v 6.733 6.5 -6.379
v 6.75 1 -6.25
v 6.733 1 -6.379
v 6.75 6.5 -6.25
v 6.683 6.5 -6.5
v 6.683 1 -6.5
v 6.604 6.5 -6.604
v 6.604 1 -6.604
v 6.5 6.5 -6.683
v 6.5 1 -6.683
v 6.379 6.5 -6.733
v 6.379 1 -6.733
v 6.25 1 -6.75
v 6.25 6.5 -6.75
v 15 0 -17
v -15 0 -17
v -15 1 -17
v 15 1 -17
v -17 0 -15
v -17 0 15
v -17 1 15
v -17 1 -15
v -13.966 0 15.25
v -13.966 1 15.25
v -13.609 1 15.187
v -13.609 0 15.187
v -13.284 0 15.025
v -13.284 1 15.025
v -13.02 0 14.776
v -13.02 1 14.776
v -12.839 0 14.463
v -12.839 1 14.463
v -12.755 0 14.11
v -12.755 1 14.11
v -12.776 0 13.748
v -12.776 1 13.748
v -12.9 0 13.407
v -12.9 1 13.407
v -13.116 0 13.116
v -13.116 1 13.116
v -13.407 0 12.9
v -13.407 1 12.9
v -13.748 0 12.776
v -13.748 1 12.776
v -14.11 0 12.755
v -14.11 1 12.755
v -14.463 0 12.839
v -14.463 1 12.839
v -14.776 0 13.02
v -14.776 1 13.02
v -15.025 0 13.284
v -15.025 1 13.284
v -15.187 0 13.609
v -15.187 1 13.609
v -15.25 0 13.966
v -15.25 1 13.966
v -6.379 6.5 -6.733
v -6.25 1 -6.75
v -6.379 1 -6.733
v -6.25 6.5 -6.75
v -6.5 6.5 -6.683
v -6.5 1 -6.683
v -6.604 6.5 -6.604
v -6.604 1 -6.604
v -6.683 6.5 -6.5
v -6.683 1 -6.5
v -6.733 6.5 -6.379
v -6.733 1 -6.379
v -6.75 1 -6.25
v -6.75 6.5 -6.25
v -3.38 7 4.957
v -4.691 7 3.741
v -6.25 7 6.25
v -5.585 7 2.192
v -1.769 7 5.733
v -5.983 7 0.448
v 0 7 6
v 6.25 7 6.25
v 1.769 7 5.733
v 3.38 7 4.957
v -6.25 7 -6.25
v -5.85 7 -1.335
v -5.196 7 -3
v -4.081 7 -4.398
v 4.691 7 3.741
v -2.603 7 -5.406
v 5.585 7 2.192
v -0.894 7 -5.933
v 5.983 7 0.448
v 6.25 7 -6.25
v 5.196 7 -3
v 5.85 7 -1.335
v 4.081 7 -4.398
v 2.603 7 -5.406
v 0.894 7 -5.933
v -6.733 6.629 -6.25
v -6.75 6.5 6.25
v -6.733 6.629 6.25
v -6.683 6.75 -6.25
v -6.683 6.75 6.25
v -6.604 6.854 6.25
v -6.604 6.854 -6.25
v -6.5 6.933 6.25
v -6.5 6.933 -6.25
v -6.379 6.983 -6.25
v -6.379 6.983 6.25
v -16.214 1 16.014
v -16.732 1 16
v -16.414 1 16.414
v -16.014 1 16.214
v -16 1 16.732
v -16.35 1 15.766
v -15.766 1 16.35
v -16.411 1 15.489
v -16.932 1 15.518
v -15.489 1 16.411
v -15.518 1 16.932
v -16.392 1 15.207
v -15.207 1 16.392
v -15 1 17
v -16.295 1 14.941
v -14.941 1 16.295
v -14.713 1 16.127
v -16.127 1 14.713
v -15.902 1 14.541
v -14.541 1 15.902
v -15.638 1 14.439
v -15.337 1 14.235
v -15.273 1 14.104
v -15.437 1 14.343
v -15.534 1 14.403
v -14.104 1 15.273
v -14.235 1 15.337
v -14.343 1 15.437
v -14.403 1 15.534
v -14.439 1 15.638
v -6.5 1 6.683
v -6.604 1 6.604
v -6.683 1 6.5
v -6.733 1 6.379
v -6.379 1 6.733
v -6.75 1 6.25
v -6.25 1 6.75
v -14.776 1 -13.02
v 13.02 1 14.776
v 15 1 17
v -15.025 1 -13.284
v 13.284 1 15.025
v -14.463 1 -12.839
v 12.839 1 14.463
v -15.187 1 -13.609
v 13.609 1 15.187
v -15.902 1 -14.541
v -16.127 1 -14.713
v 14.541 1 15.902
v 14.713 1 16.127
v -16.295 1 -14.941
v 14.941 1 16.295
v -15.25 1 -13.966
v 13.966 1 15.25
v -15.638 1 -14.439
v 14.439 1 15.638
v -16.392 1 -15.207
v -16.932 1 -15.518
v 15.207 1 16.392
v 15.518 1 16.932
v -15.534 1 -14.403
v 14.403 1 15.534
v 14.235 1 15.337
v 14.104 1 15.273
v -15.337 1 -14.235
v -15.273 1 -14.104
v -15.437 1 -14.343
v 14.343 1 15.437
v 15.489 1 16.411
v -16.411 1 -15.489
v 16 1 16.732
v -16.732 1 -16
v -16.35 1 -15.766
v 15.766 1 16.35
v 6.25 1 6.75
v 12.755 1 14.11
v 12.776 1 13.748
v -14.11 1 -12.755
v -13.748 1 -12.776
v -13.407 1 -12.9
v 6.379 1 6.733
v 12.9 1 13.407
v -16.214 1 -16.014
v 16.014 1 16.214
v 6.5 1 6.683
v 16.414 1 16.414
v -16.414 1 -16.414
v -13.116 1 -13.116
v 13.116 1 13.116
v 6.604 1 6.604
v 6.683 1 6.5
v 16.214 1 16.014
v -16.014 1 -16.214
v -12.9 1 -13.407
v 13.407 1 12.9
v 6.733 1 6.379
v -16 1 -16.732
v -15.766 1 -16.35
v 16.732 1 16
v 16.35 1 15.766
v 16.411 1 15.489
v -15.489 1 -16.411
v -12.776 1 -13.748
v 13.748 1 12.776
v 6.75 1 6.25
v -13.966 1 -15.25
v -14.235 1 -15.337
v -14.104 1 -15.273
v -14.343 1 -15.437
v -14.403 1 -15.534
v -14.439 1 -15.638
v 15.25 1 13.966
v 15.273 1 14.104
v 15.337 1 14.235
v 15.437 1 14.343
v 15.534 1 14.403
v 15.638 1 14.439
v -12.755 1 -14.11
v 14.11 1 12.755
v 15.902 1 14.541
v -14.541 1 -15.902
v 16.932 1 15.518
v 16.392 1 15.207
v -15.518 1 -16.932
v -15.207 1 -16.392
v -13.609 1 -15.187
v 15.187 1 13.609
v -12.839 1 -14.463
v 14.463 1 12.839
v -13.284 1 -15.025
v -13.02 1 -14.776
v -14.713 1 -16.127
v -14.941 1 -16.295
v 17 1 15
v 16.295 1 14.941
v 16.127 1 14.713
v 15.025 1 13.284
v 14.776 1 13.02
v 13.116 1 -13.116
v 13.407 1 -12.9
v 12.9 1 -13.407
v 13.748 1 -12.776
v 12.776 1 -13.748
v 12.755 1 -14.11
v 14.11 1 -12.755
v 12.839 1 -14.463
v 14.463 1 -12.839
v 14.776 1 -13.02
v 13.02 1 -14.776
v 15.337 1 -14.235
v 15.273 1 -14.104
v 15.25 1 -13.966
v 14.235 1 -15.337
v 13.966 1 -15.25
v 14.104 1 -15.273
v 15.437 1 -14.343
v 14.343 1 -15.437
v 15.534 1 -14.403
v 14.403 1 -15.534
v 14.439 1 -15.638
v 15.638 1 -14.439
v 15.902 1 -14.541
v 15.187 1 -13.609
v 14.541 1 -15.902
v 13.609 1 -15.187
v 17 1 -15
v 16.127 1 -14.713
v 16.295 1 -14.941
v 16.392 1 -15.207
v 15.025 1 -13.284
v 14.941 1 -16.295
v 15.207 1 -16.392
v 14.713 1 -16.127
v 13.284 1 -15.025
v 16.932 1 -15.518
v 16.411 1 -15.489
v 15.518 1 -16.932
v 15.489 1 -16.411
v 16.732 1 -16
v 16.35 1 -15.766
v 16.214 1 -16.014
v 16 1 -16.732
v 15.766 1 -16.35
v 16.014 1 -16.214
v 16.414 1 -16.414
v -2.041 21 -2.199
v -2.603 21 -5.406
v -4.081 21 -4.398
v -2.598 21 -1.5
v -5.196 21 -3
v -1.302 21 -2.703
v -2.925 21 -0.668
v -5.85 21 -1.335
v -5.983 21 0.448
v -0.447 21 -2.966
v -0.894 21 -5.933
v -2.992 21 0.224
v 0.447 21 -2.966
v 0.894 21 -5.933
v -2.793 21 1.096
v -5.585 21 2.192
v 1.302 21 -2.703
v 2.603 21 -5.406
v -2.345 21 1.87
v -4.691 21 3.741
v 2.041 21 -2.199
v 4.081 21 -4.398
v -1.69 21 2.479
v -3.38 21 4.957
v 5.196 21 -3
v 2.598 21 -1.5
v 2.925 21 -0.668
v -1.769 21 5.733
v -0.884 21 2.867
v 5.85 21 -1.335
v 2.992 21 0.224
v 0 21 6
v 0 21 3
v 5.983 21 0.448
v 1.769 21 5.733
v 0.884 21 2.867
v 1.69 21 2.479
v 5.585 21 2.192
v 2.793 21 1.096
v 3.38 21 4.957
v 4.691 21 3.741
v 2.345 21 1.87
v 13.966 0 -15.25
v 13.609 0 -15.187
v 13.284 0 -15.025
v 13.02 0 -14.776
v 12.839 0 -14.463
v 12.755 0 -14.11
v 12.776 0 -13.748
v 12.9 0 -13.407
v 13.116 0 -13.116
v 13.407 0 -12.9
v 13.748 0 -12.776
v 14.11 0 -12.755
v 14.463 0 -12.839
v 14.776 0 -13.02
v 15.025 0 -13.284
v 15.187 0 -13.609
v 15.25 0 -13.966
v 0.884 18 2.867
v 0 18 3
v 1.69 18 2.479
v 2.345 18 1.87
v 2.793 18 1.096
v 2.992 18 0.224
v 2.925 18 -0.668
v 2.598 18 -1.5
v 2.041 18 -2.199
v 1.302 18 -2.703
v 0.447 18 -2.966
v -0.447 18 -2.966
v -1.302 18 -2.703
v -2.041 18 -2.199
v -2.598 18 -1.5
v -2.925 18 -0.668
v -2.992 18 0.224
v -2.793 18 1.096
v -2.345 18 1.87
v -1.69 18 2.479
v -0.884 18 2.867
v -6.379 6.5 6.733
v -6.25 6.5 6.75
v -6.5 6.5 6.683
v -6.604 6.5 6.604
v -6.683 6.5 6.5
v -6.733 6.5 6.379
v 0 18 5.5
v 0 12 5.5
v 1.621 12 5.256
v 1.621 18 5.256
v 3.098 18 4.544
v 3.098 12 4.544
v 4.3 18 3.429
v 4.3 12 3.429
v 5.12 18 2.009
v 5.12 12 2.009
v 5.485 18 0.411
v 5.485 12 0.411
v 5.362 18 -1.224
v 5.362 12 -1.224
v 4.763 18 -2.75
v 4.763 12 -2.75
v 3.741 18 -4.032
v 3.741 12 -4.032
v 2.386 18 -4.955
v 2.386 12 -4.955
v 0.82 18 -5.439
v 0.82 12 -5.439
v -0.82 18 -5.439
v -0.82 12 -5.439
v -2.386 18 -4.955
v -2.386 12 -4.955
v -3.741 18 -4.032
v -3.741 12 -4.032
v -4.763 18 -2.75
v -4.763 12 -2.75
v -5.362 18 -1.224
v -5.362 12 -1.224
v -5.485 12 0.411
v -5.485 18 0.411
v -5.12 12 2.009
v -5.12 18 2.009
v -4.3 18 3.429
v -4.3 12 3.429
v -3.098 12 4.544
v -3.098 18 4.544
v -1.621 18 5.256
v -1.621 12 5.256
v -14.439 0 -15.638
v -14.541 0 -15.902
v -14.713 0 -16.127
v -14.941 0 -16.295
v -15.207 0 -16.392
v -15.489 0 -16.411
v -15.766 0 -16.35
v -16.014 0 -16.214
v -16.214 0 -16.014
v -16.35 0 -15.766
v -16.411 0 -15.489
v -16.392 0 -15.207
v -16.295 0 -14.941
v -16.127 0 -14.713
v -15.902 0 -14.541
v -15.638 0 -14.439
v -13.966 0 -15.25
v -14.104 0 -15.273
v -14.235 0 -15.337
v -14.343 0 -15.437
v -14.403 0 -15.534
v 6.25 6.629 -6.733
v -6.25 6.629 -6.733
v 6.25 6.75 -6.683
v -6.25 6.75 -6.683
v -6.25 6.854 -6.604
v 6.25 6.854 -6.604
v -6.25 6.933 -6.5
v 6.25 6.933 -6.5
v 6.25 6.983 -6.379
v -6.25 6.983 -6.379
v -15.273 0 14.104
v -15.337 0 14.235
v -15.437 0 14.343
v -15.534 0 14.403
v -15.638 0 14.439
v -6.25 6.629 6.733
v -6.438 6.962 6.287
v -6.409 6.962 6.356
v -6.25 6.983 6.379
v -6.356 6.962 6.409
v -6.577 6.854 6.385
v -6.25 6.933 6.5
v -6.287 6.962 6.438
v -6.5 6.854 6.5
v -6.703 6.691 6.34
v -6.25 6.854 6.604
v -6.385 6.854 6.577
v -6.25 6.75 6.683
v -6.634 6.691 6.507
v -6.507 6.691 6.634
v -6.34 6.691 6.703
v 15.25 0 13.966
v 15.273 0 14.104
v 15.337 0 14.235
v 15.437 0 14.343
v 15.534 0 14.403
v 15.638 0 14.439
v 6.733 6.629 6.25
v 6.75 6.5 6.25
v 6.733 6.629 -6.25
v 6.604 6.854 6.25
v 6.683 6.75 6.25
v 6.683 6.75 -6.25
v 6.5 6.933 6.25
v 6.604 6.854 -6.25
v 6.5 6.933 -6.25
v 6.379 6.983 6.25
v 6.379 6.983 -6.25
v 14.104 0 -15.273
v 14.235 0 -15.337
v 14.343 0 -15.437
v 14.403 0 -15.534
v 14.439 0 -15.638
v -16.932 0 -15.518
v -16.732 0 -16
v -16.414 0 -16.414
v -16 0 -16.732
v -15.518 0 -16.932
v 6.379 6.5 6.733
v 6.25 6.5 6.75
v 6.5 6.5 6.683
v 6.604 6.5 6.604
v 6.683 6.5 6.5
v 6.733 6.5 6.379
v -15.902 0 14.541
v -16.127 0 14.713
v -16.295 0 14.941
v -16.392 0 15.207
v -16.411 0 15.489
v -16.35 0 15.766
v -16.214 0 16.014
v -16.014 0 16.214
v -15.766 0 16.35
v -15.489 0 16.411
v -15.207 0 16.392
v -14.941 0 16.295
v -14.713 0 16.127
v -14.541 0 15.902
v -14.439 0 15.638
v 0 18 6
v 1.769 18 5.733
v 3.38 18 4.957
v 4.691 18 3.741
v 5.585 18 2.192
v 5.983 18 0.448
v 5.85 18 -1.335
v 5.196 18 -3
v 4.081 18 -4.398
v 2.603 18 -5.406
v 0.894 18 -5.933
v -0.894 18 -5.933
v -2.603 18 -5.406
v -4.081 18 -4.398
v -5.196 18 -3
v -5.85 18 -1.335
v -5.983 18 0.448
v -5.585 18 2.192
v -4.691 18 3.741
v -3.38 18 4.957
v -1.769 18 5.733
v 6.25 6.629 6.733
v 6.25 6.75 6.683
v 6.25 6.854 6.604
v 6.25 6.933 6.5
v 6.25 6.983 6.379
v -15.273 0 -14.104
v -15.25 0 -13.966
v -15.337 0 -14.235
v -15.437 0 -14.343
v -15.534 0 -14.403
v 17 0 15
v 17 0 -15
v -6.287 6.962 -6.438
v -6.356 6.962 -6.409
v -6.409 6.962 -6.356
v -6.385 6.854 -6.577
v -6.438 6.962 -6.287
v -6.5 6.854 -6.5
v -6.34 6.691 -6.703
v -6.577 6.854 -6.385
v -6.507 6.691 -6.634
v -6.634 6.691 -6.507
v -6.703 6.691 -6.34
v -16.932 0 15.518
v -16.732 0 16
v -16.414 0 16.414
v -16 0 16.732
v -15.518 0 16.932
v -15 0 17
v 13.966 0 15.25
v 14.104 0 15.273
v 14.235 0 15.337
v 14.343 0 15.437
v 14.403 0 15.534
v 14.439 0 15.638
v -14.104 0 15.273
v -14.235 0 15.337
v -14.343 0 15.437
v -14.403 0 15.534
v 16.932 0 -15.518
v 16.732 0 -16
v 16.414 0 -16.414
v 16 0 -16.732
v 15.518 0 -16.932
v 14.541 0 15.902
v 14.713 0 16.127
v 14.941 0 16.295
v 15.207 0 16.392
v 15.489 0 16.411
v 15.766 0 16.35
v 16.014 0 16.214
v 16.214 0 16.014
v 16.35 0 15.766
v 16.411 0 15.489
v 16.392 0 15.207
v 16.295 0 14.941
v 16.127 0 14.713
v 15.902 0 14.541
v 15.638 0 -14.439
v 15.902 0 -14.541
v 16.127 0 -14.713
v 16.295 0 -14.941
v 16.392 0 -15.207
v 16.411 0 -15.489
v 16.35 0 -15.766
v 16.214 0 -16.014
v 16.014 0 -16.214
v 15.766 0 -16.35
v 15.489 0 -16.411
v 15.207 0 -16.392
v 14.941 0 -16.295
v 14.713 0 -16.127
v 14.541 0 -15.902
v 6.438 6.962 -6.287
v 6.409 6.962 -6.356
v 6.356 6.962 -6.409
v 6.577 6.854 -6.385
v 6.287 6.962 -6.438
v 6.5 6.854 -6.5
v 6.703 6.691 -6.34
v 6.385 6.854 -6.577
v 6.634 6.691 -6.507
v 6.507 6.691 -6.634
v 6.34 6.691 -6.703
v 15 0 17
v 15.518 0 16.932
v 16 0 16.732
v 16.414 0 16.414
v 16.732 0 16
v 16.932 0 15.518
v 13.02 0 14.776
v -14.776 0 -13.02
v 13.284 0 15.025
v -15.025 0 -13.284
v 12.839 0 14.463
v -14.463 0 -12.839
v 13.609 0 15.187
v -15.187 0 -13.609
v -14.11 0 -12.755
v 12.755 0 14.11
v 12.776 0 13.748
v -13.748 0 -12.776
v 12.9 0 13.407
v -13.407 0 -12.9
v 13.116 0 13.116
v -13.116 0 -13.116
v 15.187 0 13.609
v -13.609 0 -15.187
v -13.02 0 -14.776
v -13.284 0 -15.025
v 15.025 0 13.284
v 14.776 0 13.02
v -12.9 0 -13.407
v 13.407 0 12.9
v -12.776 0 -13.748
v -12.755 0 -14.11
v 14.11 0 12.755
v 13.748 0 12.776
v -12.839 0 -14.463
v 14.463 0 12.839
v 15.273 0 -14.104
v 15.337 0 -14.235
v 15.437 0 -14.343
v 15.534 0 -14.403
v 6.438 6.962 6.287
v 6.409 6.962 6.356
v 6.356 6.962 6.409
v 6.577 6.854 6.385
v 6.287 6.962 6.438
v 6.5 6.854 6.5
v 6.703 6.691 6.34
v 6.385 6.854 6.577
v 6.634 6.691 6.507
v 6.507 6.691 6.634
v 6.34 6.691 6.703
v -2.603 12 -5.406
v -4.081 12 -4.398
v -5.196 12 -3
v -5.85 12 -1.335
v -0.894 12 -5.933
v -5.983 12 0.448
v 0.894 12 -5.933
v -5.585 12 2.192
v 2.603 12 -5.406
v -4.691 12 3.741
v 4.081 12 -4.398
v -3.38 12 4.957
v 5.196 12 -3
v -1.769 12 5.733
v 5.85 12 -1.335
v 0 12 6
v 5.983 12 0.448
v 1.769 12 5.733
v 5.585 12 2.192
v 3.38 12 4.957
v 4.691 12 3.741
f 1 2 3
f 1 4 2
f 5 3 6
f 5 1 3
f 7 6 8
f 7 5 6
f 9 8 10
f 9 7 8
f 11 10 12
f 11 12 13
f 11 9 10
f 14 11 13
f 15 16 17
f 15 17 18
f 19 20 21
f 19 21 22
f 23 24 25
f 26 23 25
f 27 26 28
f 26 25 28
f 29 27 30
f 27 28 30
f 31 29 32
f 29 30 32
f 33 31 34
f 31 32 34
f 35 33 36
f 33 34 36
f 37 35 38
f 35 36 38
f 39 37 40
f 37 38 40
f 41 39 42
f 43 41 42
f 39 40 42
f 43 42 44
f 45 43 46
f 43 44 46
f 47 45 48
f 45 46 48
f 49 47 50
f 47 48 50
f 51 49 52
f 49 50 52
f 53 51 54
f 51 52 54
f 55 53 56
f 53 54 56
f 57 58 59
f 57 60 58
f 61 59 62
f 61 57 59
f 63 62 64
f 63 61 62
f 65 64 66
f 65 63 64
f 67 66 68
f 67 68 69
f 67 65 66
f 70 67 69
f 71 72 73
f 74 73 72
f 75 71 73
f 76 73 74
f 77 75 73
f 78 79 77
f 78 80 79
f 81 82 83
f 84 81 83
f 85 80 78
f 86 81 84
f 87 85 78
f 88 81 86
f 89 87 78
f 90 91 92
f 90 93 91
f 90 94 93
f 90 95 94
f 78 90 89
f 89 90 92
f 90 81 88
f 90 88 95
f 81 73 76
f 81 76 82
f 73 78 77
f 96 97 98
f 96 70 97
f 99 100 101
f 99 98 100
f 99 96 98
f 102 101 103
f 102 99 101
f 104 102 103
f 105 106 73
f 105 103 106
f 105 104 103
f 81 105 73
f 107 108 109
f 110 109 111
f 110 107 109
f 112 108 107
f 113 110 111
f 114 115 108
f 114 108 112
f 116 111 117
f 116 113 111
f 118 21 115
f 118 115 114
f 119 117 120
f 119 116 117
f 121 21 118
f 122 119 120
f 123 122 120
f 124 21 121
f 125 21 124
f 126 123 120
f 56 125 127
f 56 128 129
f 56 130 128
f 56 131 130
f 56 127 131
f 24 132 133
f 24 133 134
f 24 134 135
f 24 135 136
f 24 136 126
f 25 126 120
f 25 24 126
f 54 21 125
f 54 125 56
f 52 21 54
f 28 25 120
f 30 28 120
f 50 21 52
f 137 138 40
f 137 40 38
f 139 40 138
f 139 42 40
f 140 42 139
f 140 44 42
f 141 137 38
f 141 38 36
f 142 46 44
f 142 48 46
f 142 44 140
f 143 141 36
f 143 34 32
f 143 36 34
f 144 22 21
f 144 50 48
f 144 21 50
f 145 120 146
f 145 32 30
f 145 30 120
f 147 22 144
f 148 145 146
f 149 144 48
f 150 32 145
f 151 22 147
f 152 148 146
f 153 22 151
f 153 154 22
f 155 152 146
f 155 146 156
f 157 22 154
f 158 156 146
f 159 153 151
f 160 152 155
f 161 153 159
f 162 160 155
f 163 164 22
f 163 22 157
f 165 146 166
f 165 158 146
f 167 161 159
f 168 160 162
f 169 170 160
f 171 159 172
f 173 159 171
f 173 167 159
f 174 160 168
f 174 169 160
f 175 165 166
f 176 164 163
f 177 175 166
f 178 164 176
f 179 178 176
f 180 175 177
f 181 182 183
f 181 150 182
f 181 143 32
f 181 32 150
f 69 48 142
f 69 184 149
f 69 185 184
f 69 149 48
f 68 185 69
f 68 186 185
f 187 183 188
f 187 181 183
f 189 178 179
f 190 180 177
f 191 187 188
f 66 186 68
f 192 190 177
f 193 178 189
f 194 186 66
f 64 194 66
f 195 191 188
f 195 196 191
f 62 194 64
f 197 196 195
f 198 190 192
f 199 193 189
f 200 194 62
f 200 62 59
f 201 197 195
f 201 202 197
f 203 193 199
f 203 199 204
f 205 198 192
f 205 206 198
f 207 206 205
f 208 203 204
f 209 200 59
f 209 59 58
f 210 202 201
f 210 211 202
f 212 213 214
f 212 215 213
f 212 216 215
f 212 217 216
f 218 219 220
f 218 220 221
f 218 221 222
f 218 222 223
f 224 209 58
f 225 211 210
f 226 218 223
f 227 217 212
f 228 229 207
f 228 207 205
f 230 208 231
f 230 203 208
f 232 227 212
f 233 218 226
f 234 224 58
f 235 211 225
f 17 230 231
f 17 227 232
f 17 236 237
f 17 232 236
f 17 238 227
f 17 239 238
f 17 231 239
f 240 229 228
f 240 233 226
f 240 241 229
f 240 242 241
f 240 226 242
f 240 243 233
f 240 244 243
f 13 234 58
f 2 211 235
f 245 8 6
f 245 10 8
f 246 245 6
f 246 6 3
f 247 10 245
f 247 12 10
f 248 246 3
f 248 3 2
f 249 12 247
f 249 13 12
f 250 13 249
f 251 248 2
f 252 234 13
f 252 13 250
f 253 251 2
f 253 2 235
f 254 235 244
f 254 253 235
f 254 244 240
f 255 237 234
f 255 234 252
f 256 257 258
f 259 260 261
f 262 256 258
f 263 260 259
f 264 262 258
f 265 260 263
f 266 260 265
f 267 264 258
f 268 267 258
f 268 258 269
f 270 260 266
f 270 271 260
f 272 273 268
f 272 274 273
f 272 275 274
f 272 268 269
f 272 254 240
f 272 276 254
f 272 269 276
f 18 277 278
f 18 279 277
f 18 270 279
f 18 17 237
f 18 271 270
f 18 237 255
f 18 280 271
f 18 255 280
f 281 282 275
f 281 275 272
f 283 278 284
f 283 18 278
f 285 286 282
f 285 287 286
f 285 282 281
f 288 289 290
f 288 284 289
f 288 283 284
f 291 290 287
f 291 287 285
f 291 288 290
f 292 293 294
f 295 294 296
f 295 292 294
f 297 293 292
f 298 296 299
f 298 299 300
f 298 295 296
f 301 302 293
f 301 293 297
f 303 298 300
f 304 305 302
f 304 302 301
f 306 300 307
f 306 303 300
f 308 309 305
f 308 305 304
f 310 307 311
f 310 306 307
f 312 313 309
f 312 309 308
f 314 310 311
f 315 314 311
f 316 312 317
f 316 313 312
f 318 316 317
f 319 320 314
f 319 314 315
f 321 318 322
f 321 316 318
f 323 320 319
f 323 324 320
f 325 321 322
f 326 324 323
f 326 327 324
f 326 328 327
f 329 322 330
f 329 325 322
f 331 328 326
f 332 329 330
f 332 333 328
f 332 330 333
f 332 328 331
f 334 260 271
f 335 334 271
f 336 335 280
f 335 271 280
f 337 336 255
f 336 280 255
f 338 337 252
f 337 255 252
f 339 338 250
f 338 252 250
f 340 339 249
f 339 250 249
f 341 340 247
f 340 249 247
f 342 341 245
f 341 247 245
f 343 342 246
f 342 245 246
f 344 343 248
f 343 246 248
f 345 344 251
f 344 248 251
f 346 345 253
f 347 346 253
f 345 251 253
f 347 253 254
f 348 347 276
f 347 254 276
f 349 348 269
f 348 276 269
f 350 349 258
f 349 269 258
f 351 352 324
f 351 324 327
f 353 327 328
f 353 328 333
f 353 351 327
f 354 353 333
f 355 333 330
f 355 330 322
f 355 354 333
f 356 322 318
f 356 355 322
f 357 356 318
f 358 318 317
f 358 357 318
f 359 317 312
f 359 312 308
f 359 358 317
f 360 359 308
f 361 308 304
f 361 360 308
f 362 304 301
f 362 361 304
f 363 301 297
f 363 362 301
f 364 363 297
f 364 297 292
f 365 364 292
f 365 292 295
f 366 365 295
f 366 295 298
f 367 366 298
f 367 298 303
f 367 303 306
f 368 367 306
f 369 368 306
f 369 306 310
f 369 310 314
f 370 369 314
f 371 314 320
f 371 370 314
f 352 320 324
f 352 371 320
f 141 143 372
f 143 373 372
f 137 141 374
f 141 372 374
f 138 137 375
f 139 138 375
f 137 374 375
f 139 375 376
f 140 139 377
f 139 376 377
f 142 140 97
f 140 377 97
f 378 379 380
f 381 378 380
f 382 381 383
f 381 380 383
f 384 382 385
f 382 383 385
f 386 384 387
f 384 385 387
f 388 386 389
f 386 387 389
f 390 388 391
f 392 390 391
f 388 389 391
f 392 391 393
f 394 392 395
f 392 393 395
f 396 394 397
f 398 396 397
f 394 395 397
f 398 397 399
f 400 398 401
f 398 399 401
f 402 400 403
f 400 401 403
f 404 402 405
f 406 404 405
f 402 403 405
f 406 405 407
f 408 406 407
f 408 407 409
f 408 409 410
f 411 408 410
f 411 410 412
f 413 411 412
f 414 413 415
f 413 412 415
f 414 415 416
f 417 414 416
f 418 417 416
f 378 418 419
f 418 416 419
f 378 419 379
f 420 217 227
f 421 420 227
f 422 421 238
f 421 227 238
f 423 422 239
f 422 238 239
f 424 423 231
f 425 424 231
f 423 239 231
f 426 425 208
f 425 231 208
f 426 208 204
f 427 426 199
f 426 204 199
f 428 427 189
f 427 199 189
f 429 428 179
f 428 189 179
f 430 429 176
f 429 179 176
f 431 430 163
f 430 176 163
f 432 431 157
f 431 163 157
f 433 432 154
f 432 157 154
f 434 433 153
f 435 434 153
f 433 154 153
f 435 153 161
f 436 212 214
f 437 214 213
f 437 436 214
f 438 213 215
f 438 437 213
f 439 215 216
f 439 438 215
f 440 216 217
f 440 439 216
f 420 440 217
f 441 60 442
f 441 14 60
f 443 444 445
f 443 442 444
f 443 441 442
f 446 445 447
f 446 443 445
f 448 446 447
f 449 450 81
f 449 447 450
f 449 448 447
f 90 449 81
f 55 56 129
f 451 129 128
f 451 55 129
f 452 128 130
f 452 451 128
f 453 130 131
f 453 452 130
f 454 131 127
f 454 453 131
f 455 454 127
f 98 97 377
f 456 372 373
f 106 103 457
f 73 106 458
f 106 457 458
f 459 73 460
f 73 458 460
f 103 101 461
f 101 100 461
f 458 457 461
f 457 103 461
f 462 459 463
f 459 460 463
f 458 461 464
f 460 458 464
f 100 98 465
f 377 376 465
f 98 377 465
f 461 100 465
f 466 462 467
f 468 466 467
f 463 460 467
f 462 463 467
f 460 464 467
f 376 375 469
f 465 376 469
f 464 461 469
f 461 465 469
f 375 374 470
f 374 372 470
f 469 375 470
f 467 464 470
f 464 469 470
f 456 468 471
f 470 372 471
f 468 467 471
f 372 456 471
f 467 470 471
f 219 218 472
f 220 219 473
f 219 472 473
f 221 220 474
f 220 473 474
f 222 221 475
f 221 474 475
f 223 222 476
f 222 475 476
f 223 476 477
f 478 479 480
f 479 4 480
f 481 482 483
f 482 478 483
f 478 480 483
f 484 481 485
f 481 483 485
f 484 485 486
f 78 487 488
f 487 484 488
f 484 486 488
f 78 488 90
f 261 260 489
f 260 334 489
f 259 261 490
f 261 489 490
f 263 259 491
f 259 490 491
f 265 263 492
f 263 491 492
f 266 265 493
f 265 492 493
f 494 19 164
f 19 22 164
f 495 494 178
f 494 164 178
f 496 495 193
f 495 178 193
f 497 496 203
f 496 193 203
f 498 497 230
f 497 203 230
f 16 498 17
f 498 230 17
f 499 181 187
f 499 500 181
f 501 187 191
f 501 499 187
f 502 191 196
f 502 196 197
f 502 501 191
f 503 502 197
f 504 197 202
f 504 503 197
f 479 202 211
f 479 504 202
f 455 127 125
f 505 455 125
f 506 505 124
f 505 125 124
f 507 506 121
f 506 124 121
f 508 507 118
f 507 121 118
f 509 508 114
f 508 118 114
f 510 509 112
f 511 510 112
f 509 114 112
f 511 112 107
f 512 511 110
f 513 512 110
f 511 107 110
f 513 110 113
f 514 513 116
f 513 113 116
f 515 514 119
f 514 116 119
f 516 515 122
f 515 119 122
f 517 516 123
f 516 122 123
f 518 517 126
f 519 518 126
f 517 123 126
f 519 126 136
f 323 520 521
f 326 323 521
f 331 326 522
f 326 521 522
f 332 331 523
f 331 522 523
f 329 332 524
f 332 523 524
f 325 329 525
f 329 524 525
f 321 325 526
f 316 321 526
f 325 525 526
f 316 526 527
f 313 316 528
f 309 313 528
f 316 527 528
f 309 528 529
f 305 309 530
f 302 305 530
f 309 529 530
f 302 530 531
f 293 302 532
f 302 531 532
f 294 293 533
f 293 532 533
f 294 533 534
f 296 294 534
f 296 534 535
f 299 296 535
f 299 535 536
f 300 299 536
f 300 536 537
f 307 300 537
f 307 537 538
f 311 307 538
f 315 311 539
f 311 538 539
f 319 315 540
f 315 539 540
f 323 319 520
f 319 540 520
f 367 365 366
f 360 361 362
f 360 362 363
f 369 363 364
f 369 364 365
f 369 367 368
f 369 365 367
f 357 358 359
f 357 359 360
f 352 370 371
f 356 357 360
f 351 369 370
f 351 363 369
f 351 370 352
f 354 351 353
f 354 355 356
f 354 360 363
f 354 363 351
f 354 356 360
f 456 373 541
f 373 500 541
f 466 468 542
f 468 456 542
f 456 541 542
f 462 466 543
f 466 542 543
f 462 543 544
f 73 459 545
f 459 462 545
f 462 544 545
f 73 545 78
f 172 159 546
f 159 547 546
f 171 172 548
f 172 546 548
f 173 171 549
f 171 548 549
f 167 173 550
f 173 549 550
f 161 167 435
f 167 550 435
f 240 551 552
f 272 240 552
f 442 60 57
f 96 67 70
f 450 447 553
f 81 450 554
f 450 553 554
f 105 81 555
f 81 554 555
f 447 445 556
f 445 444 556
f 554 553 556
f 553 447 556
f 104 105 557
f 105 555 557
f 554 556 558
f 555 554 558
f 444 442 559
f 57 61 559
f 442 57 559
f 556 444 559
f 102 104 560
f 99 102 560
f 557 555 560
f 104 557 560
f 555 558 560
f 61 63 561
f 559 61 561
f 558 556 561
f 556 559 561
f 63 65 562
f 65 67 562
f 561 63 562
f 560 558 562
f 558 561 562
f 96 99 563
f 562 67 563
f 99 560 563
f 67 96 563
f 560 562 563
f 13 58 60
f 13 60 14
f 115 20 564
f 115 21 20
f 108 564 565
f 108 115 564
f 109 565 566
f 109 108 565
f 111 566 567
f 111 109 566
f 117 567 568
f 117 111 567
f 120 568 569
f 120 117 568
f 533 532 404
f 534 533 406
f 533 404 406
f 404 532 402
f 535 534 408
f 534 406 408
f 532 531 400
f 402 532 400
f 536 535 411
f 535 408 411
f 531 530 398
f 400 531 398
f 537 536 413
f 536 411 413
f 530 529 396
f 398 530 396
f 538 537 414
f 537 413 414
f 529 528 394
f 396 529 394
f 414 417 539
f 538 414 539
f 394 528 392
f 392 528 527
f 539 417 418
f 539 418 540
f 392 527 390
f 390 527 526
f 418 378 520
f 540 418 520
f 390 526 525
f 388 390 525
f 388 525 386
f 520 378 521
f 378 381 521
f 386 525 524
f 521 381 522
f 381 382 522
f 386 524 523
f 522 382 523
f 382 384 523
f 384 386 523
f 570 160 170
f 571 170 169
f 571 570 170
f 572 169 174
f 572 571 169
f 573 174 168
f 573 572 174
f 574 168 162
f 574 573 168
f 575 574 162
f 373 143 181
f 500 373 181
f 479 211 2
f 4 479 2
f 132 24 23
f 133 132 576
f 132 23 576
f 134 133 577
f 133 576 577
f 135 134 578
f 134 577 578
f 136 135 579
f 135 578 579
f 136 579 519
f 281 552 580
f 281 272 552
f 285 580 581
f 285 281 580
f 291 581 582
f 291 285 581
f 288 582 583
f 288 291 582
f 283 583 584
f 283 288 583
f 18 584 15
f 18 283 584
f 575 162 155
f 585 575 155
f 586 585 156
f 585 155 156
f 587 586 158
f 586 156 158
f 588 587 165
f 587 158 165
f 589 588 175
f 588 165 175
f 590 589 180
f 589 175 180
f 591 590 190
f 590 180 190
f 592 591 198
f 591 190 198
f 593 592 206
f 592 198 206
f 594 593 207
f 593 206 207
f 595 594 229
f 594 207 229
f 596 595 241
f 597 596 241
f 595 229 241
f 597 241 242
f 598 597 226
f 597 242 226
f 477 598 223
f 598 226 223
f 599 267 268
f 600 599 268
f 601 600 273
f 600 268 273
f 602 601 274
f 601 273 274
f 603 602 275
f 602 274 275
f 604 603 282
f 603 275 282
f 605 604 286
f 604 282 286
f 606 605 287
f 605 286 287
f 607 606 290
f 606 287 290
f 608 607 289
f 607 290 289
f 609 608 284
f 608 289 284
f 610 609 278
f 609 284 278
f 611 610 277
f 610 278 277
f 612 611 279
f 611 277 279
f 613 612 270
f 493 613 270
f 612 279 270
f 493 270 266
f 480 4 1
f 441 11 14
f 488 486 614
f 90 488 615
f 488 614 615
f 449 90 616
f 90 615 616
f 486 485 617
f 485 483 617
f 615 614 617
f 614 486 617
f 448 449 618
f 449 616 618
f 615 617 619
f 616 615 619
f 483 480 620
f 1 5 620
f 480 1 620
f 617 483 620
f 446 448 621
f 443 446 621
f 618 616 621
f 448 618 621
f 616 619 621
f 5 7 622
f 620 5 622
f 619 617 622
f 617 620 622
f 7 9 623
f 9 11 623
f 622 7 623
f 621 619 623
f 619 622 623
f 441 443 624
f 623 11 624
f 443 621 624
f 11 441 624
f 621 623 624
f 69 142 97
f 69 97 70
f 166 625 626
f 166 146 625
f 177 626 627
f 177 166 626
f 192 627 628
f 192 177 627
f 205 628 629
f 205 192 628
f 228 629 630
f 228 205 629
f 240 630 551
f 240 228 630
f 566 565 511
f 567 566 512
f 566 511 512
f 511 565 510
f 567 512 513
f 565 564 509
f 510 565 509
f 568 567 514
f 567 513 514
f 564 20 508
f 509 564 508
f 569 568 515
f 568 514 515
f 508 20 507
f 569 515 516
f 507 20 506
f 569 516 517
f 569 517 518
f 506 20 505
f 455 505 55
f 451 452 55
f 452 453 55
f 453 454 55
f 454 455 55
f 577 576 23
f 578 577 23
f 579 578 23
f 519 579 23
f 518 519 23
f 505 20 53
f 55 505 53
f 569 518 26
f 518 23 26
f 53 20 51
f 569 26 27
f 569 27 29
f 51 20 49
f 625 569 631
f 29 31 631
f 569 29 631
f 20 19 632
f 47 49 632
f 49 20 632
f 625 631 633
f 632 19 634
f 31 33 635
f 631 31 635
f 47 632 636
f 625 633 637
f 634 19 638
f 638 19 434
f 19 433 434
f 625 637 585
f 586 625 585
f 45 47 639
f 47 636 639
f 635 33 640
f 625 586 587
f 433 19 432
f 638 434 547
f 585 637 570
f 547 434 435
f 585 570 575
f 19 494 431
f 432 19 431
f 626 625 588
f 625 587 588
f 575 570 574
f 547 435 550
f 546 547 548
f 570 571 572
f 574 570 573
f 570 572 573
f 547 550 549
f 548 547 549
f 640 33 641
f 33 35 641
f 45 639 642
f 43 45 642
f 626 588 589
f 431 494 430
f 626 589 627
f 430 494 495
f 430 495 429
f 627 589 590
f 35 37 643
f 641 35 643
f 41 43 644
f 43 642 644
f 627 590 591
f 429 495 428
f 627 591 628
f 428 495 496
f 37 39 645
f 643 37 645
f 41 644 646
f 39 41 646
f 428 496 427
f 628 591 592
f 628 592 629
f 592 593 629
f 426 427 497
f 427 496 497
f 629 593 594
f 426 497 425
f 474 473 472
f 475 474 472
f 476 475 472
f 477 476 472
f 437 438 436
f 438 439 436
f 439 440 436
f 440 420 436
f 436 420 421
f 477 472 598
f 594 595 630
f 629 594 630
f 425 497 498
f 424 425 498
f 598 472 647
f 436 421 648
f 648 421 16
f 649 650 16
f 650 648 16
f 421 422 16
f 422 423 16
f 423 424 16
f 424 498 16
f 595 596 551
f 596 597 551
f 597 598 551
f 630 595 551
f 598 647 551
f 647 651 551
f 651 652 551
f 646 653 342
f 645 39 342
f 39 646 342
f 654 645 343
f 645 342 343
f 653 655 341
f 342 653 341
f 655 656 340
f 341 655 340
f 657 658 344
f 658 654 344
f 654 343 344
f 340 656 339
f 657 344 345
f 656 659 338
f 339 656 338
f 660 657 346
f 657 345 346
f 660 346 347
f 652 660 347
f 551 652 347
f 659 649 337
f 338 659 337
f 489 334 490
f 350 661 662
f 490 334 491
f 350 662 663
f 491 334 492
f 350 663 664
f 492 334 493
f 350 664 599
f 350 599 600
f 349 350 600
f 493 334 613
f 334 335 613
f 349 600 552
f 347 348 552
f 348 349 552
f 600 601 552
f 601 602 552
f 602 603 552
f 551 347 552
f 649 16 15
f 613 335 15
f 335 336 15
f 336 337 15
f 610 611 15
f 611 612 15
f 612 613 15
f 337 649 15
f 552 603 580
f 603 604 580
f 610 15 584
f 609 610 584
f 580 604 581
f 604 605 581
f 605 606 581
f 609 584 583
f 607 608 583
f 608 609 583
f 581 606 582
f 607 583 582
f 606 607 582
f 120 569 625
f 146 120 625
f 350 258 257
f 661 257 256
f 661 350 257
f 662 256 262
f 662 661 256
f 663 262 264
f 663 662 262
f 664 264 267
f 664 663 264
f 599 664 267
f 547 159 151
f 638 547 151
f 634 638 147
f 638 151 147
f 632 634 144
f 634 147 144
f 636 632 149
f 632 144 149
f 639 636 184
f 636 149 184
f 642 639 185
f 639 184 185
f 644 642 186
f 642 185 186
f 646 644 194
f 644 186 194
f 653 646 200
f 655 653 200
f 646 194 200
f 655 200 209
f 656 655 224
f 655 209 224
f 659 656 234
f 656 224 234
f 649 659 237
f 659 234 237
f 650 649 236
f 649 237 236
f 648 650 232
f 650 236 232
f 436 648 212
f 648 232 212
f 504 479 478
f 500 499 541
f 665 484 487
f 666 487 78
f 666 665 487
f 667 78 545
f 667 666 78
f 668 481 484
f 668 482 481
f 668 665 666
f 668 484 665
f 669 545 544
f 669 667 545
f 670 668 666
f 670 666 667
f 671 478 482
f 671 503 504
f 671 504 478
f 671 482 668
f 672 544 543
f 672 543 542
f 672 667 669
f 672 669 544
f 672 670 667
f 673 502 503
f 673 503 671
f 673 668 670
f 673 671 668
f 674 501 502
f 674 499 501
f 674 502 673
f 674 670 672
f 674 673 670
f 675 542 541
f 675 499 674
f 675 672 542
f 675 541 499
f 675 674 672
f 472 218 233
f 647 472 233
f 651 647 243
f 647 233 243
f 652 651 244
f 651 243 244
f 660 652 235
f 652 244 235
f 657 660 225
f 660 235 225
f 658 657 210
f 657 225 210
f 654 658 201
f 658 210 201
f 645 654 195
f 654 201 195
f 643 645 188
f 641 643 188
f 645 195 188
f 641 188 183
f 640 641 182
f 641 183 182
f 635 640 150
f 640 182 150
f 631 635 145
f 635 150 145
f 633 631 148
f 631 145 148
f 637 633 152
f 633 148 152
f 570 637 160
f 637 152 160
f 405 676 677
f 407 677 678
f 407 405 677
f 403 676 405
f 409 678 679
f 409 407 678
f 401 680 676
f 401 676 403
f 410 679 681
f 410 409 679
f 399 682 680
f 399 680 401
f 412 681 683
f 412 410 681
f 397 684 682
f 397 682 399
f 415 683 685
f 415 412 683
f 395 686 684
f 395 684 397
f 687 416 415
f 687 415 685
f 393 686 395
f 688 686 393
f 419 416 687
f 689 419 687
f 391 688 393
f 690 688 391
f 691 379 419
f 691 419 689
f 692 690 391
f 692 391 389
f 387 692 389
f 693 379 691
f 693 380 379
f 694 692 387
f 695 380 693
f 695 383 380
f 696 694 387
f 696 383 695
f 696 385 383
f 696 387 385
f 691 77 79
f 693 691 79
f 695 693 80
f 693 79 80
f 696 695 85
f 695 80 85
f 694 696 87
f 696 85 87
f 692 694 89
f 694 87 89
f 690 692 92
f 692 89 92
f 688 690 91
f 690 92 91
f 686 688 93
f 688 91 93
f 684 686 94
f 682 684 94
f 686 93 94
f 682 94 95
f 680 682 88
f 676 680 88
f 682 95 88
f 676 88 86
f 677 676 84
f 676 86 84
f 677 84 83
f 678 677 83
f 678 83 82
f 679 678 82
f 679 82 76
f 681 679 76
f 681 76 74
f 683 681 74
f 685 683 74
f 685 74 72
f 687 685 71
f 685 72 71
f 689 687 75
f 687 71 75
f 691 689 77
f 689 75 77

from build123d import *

# Parameters (mm, degrees)
SKETCH2_W           = 34
SKETCH2_H           = 34
BOSS_EXTRUDE2_DEPTH = 1
FILLET1_R           = 2
SKETCH3_W           = 13.5
SKETCH3_H           = 13.5
BOSS_EXTRUDE3_DEPTH = 6
SKETCH4_R           = 6
BOSS_EXTRUDE4_DEPTH = 5
FILLET2_R           = 0.5
SKETCH5_R           = 5.5
BOSS_EXTRUDE5_DEPTH = 6
SKETCH6_R           = 6
SKETCH6_R_2         = 3
BOSS_EXTRUDE6_DEPTH = 3
SKETCH7_R           = 1
SKETCH7_R_2         = 1.25
CUT_EXTRUDE1_DEPTH  = 32.272991542
FILLET3_R           = 0.5


with BuildPart() as part:
    # Sketch2 → Boss-Extrude2 (new body)
    with BuildSketch(Plane(origin=(0, 0, 0), x_dir=(1, 0, 0), z_dir=(0, 1, 0))):
        Rectangle(SKETCH2_W, SKETCH2_H)
    extrude(amount=BOSS_EXTRUDE2_DEPTH)

    # Fillet1
    fillet1_edges = [part.edges().sort_by_distance(p)[0] for p in [
        (17, 0.5, 17),
        (-17, 0.5, 17),
        (-17, 0.5, -17),
        (17, 0.5, -17),
    ]]
    fillet(fillet1_edges, radius=FILLET1_R)

    # Sketch3 → Boss-Extrude3 (add)
    with BuildSketch(Plane(origin=(0, 1, 0), x_dir=(1, 0, 0), z_dir=(0, 1, 0))):
        Rectangle(SKETCH3_W, SKETCH3_H)
    extrude(amount=BOSS_EXTRUDE3_DEPTH)

    # Sketch4 → Boss-Extrude4 (add)
    with BuildSketch(Plane(origin=(0, 7, 0), x_dir=(1, 0, 0), z_dir=(0, 1, 0))):
        with Locations(Location((0, 0, 0), (0, 0, 270))):
            Circle(SKETCH4_R)
    extrude(amount=BOSS_EXTRUDE4_DEPTH)

    # Fillet2
    fillet2_edges = [part.edges().sort_by_distance(p)[0] for p in [
        (6.75, 4, 6.75),
        (6.75, 4, -6.75),
        (-6.75, 4, -6.75),
        (-6.75, 4, 6.75),
        (6.75, 7, 0),
        (0, 7, -6.75),
        (-6.75, 7, 0),
        (0, 7, 6.75),
    ]]
    fillet(fillet2_edges, radius=FILLET2_R)

    # Sketch5 → Boss-Extrude5 (add)
    with BuildSketch(Plane(origin=(0, 12, 0), x_dir=(1, 0, 0), z_dir=(0, 1, 0))):
        with Locations(Location((0, 0, 0), (0, 0, 270))):
            Circle(SKETCH5_R)
    extrude(amount=BOSS_EXTRUDE5_DEPTH)

    # Sketch6 → Boss-Extrude6 (add)
    with BuildSketch(Plane(origin=(0, 18, 0), x_dir=(1, 0, 0), z_dir=(0, 1, 0))):
        with Locations(Location((0, 0, 0), (0, 0, 270))):
            Circle(SKETCH6_R)
        with Locations(Location((0, 0, 0), (0, 0, 270))):
            Circle(SKETCH6_R_2, mode=Mode.SUBTRACT)
    extrude(amount=BOSS_EXTRUDE6_DEPTH)

    # Sketch7 → Cut-Extrude1 (cut, through all)
    with BuildSketch(Plane(origin=(0, 1, 0), x_dir=(1, 0, 0), z_dir=(0, 1, 0))):
        with Locations((-15.414213562, -15.414213562)):
            Circle(SKETCH7_R)
        with Locations((-14, -14)):
            Circle(SKETCH7_R_2)
        with Locations((15.414213562, -15.414213562)):
            Circle(SKETCH7_R)
        with Locations((14, -14)):
            Circle(SKETCH7_R_2)
        with Locations((15.414213562, 15.414213562)):
            Circle(SKETCH7_R)
        with Locations((14, 14)):
            Circle(SKETCH7_R_2)
        with Locations((-15.414213562, 15.414213562)):
            Circle(SKETCH7_R)
        with Locations((-14, 14)):
            Circle(SKETCH7_R_2)
    extrude(amount=-CUT_EXTRUDE1_DEPTH, mode=Mode.SUBTRACT)

    # Fillet3
    fillet3_edges = [part.edges().sort_by_distance(p)[0] for p in [
        (-14.444967533, 0.5, -15.168119812),
        (-15.168119812, 0.5, -14.444967533),
        (15.168119812, 0.5, -14.444967533),
        (14.444967533, 0.5, -15.168119812),
        (14.444967533, 0.5, 15.168119812),
        (15.168119812, 0.5, 14.444967533),
        (-15.168119812, 0.5, 14.444967533),
        (-14.444967533, 0.5, 15.168119812),
    ]]
    fillet(fillet3_edges, radius=FILLET3_R)


solid = part.part
